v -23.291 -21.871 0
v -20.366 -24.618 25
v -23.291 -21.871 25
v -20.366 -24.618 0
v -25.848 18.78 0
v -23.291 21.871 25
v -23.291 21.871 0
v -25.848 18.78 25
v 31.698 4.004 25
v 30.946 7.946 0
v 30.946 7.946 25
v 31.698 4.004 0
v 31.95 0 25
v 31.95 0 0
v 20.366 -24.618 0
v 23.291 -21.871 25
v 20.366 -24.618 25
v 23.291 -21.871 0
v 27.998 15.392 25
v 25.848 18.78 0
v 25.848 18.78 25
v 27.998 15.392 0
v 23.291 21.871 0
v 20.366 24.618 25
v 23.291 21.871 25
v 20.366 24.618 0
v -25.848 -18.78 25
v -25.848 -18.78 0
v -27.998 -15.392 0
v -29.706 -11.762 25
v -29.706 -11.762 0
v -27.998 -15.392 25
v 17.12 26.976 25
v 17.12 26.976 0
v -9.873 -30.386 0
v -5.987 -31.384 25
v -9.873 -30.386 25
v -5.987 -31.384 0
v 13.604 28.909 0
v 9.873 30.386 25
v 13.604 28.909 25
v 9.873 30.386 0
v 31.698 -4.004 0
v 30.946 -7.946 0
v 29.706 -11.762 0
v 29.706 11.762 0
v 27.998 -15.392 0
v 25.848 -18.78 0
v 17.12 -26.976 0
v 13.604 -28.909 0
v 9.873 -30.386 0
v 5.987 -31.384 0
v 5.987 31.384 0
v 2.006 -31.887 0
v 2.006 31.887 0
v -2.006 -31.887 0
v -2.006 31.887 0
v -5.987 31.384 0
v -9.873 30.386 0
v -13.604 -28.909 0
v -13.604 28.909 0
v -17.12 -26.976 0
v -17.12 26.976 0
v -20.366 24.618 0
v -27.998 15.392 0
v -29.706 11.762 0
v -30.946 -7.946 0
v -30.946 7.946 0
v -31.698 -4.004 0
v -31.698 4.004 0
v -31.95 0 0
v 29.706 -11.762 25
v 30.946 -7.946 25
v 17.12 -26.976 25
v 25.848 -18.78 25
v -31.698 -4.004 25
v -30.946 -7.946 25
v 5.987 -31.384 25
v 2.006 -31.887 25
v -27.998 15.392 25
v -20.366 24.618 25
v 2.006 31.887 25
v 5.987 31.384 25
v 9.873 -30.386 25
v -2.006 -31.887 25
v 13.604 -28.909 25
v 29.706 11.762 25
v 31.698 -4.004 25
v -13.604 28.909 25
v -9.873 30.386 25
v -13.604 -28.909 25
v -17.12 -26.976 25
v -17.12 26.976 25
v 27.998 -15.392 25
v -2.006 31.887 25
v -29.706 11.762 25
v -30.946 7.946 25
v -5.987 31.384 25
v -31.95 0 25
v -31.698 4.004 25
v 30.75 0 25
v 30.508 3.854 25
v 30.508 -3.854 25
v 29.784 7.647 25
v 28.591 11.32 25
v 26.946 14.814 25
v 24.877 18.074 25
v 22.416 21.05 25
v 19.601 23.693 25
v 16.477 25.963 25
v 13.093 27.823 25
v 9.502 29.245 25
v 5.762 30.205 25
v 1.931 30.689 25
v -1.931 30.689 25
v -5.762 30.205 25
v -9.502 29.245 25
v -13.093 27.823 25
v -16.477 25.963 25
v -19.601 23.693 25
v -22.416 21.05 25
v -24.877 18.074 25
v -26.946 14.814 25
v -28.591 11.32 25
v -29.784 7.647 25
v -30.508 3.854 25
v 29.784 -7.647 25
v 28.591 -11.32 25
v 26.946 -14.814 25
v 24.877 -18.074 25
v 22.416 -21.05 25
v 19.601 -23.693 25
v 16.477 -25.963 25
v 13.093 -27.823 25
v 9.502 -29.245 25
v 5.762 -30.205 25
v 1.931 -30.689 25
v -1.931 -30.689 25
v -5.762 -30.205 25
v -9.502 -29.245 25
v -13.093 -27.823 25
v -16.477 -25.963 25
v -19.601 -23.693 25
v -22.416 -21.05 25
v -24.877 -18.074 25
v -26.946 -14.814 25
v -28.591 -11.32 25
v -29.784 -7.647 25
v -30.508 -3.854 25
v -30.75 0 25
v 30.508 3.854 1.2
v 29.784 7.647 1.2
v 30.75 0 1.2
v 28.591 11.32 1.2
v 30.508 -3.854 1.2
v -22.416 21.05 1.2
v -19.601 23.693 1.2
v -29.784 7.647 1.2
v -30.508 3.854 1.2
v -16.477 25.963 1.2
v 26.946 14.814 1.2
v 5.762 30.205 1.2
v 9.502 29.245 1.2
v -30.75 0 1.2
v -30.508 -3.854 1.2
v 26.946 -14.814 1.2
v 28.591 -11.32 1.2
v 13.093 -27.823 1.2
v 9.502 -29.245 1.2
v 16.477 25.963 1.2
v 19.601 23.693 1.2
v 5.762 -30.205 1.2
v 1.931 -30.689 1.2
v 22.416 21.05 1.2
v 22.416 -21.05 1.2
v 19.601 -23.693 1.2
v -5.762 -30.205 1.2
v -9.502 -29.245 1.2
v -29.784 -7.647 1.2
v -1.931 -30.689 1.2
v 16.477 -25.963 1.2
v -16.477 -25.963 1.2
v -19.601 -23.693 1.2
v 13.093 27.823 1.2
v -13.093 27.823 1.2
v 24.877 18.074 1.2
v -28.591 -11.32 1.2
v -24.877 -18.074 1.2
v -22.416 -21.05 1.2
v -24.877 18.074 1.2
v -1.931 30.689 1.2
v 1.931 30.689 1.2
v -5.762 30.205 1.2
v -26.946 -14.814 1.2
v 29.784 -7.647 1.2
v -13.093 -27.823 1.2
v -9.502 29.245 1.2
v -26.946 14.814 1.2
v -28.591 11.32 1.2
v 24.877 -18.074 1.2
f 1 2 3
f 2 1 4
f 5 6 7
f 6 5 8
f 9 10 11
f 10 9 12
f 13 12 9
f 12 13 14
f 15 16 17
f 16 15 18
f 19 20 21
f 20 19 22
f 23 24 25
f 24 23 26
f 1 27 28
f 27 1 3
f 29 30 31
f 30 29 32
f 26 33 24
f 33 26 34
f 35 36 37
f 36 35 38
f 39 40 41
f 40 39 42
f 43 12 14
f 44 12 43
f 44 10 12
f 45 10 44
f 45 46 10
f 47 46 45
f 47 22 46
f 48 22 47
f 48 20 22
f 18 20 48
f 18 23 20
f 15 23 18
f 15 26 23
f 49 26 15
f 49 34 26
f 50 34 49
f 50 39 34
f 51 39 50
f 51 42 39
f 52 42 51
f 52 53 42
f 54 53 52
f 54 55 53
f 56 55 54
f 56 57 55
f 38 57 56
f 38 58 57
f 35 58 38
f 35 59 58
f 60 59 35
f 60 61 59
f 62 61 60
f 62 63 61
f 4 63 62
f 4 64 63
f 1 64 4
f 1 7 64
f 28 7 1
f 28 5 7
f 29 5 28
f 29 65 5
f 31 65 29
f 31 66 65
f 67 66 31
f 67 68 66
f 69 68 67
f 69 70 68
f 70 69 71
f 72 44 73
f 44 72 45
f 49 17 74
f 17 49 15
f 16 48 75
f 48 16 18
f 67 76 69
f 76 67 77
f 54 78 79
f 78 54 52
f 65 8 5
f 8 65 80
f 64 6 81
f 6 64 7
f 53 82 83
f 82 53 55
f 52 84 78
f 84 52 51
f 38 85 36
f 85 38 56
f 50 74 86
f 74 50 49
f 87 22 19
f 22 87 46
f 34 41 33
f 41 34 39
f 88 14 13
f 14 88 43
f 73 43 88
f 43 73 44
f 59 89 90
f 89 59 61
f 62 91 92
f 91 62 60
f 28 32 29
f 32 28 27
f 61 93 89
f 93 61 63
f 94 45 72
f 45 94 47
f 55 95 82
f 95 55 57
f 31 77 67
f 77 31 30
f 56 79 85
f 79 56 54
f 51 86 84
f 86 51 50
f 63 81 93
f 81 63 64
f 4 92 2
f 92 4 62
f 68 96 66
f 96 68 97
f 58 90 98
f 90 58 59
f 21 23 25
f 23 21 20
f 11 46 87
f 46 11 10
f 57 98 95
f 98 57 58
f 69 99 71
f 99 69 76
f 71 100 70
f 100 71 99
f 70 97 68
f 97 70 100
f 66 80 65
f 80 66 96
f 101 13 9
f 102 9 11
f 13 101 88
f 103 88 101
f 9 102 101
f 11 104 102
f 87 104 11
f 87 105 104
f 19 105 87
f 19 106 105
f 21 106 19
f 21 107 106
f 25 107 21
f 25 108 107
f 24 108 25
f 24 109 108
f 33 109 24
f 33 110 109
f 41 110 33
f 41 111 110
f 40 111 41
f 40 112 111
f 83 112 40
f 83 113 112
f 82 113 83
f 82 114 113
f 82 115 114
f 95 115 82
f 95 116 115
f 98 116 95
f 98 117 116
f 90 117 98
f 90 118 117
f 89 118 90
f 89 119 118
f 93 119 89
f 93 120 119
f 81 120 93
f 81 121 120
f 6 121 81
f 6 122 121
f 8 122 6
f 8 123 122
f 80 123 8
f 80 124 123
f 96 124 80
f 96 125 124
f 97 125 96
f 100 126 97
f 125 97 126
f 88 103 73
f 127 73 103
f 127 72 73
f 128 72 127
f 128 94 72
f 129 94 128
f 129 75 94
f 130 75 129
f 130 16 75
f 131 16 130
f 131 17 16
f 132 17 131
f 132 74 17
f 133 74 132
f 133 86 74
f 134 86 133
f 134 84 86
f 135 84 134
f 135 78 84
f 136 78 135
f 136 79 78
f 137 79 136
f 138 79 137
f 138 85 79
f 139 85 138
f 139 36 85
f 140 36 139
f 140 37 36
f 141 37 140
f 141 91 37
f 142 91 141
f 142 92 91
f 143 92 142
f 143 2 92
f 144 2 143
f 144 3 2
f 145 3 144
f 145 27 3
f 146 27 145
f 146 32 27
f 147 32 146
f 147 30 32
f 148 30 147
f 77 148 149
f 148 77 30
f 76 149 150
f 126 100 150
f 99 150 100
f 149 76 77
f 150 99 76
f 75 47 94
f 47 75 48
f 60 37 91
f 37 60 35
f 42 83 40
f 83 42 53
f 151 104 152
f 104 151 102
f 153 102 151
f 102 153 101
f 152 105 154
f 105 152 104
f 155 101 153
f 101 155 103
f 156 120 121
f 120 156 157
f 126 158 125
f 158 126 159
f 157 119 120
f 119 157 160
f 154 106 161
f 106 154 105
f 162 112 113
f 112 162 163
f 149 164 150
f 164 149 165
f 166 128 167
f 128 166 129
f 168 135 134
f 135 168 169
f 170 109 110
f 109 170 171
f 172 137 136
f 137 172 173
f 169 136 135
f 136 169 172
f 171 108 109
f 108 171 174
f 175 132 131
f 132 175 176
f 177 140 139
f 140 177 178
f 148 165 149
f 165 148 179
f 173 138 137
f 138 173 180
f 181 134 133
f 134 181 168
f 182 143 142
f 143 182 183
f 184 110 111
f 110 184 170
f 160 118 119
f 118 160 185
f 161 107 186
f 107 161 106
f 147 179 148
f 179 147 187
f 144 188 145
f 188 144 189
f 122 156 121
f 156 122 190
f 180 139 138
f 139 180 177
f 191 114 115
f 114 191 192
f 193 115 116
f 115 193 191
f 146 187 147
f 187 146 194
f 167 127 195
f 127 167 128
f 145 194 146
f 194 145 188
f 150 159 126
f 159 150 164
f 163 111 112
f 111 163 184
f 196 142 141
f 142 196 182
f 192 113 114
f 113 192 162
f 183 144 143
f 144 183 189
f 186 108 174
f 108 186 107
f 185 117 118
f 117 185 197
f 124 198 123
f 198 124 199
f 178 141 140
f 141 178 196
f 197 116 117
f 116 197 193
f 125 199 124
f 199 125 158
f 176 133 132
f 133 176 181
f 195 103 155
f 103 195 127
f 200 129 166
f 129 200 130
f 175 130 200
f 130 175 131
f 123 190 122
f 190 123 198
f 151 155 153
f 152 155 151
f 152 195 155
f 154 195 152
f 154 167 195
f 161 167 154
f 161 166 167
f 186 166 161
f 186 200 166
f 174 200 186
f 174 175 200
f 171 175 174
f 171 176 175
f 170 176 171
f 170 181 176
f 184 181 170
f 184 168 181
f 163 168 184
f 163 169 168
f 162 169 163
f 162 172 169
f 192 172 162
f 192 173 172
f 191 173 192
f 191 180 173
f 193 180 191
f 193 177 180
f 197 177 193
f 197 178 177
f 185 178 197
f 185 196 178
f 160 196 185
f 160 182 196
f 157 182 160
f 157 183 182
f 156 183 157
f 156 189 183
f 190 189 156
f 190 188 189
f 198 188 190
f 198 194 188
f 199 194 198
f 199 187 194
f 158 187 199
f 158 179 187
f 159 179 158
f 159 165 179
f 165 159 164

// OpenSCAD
// Fitting Cap
 
$fn = 50;
 
// Parameters
inner_radius = 30.75;
wall_thickness = 1.2;
outer_radius = inner_radius + wall_thickness;
height = 25;
 
difference() {
    // This piece will be created:
    cylinder(r=outer_radius, h=height, center=false);
 
    // Everything else listed will be taken away:
    translate([0,0,1.2])cylinder(r=inner_radius, h=height, center=false);
}


    
